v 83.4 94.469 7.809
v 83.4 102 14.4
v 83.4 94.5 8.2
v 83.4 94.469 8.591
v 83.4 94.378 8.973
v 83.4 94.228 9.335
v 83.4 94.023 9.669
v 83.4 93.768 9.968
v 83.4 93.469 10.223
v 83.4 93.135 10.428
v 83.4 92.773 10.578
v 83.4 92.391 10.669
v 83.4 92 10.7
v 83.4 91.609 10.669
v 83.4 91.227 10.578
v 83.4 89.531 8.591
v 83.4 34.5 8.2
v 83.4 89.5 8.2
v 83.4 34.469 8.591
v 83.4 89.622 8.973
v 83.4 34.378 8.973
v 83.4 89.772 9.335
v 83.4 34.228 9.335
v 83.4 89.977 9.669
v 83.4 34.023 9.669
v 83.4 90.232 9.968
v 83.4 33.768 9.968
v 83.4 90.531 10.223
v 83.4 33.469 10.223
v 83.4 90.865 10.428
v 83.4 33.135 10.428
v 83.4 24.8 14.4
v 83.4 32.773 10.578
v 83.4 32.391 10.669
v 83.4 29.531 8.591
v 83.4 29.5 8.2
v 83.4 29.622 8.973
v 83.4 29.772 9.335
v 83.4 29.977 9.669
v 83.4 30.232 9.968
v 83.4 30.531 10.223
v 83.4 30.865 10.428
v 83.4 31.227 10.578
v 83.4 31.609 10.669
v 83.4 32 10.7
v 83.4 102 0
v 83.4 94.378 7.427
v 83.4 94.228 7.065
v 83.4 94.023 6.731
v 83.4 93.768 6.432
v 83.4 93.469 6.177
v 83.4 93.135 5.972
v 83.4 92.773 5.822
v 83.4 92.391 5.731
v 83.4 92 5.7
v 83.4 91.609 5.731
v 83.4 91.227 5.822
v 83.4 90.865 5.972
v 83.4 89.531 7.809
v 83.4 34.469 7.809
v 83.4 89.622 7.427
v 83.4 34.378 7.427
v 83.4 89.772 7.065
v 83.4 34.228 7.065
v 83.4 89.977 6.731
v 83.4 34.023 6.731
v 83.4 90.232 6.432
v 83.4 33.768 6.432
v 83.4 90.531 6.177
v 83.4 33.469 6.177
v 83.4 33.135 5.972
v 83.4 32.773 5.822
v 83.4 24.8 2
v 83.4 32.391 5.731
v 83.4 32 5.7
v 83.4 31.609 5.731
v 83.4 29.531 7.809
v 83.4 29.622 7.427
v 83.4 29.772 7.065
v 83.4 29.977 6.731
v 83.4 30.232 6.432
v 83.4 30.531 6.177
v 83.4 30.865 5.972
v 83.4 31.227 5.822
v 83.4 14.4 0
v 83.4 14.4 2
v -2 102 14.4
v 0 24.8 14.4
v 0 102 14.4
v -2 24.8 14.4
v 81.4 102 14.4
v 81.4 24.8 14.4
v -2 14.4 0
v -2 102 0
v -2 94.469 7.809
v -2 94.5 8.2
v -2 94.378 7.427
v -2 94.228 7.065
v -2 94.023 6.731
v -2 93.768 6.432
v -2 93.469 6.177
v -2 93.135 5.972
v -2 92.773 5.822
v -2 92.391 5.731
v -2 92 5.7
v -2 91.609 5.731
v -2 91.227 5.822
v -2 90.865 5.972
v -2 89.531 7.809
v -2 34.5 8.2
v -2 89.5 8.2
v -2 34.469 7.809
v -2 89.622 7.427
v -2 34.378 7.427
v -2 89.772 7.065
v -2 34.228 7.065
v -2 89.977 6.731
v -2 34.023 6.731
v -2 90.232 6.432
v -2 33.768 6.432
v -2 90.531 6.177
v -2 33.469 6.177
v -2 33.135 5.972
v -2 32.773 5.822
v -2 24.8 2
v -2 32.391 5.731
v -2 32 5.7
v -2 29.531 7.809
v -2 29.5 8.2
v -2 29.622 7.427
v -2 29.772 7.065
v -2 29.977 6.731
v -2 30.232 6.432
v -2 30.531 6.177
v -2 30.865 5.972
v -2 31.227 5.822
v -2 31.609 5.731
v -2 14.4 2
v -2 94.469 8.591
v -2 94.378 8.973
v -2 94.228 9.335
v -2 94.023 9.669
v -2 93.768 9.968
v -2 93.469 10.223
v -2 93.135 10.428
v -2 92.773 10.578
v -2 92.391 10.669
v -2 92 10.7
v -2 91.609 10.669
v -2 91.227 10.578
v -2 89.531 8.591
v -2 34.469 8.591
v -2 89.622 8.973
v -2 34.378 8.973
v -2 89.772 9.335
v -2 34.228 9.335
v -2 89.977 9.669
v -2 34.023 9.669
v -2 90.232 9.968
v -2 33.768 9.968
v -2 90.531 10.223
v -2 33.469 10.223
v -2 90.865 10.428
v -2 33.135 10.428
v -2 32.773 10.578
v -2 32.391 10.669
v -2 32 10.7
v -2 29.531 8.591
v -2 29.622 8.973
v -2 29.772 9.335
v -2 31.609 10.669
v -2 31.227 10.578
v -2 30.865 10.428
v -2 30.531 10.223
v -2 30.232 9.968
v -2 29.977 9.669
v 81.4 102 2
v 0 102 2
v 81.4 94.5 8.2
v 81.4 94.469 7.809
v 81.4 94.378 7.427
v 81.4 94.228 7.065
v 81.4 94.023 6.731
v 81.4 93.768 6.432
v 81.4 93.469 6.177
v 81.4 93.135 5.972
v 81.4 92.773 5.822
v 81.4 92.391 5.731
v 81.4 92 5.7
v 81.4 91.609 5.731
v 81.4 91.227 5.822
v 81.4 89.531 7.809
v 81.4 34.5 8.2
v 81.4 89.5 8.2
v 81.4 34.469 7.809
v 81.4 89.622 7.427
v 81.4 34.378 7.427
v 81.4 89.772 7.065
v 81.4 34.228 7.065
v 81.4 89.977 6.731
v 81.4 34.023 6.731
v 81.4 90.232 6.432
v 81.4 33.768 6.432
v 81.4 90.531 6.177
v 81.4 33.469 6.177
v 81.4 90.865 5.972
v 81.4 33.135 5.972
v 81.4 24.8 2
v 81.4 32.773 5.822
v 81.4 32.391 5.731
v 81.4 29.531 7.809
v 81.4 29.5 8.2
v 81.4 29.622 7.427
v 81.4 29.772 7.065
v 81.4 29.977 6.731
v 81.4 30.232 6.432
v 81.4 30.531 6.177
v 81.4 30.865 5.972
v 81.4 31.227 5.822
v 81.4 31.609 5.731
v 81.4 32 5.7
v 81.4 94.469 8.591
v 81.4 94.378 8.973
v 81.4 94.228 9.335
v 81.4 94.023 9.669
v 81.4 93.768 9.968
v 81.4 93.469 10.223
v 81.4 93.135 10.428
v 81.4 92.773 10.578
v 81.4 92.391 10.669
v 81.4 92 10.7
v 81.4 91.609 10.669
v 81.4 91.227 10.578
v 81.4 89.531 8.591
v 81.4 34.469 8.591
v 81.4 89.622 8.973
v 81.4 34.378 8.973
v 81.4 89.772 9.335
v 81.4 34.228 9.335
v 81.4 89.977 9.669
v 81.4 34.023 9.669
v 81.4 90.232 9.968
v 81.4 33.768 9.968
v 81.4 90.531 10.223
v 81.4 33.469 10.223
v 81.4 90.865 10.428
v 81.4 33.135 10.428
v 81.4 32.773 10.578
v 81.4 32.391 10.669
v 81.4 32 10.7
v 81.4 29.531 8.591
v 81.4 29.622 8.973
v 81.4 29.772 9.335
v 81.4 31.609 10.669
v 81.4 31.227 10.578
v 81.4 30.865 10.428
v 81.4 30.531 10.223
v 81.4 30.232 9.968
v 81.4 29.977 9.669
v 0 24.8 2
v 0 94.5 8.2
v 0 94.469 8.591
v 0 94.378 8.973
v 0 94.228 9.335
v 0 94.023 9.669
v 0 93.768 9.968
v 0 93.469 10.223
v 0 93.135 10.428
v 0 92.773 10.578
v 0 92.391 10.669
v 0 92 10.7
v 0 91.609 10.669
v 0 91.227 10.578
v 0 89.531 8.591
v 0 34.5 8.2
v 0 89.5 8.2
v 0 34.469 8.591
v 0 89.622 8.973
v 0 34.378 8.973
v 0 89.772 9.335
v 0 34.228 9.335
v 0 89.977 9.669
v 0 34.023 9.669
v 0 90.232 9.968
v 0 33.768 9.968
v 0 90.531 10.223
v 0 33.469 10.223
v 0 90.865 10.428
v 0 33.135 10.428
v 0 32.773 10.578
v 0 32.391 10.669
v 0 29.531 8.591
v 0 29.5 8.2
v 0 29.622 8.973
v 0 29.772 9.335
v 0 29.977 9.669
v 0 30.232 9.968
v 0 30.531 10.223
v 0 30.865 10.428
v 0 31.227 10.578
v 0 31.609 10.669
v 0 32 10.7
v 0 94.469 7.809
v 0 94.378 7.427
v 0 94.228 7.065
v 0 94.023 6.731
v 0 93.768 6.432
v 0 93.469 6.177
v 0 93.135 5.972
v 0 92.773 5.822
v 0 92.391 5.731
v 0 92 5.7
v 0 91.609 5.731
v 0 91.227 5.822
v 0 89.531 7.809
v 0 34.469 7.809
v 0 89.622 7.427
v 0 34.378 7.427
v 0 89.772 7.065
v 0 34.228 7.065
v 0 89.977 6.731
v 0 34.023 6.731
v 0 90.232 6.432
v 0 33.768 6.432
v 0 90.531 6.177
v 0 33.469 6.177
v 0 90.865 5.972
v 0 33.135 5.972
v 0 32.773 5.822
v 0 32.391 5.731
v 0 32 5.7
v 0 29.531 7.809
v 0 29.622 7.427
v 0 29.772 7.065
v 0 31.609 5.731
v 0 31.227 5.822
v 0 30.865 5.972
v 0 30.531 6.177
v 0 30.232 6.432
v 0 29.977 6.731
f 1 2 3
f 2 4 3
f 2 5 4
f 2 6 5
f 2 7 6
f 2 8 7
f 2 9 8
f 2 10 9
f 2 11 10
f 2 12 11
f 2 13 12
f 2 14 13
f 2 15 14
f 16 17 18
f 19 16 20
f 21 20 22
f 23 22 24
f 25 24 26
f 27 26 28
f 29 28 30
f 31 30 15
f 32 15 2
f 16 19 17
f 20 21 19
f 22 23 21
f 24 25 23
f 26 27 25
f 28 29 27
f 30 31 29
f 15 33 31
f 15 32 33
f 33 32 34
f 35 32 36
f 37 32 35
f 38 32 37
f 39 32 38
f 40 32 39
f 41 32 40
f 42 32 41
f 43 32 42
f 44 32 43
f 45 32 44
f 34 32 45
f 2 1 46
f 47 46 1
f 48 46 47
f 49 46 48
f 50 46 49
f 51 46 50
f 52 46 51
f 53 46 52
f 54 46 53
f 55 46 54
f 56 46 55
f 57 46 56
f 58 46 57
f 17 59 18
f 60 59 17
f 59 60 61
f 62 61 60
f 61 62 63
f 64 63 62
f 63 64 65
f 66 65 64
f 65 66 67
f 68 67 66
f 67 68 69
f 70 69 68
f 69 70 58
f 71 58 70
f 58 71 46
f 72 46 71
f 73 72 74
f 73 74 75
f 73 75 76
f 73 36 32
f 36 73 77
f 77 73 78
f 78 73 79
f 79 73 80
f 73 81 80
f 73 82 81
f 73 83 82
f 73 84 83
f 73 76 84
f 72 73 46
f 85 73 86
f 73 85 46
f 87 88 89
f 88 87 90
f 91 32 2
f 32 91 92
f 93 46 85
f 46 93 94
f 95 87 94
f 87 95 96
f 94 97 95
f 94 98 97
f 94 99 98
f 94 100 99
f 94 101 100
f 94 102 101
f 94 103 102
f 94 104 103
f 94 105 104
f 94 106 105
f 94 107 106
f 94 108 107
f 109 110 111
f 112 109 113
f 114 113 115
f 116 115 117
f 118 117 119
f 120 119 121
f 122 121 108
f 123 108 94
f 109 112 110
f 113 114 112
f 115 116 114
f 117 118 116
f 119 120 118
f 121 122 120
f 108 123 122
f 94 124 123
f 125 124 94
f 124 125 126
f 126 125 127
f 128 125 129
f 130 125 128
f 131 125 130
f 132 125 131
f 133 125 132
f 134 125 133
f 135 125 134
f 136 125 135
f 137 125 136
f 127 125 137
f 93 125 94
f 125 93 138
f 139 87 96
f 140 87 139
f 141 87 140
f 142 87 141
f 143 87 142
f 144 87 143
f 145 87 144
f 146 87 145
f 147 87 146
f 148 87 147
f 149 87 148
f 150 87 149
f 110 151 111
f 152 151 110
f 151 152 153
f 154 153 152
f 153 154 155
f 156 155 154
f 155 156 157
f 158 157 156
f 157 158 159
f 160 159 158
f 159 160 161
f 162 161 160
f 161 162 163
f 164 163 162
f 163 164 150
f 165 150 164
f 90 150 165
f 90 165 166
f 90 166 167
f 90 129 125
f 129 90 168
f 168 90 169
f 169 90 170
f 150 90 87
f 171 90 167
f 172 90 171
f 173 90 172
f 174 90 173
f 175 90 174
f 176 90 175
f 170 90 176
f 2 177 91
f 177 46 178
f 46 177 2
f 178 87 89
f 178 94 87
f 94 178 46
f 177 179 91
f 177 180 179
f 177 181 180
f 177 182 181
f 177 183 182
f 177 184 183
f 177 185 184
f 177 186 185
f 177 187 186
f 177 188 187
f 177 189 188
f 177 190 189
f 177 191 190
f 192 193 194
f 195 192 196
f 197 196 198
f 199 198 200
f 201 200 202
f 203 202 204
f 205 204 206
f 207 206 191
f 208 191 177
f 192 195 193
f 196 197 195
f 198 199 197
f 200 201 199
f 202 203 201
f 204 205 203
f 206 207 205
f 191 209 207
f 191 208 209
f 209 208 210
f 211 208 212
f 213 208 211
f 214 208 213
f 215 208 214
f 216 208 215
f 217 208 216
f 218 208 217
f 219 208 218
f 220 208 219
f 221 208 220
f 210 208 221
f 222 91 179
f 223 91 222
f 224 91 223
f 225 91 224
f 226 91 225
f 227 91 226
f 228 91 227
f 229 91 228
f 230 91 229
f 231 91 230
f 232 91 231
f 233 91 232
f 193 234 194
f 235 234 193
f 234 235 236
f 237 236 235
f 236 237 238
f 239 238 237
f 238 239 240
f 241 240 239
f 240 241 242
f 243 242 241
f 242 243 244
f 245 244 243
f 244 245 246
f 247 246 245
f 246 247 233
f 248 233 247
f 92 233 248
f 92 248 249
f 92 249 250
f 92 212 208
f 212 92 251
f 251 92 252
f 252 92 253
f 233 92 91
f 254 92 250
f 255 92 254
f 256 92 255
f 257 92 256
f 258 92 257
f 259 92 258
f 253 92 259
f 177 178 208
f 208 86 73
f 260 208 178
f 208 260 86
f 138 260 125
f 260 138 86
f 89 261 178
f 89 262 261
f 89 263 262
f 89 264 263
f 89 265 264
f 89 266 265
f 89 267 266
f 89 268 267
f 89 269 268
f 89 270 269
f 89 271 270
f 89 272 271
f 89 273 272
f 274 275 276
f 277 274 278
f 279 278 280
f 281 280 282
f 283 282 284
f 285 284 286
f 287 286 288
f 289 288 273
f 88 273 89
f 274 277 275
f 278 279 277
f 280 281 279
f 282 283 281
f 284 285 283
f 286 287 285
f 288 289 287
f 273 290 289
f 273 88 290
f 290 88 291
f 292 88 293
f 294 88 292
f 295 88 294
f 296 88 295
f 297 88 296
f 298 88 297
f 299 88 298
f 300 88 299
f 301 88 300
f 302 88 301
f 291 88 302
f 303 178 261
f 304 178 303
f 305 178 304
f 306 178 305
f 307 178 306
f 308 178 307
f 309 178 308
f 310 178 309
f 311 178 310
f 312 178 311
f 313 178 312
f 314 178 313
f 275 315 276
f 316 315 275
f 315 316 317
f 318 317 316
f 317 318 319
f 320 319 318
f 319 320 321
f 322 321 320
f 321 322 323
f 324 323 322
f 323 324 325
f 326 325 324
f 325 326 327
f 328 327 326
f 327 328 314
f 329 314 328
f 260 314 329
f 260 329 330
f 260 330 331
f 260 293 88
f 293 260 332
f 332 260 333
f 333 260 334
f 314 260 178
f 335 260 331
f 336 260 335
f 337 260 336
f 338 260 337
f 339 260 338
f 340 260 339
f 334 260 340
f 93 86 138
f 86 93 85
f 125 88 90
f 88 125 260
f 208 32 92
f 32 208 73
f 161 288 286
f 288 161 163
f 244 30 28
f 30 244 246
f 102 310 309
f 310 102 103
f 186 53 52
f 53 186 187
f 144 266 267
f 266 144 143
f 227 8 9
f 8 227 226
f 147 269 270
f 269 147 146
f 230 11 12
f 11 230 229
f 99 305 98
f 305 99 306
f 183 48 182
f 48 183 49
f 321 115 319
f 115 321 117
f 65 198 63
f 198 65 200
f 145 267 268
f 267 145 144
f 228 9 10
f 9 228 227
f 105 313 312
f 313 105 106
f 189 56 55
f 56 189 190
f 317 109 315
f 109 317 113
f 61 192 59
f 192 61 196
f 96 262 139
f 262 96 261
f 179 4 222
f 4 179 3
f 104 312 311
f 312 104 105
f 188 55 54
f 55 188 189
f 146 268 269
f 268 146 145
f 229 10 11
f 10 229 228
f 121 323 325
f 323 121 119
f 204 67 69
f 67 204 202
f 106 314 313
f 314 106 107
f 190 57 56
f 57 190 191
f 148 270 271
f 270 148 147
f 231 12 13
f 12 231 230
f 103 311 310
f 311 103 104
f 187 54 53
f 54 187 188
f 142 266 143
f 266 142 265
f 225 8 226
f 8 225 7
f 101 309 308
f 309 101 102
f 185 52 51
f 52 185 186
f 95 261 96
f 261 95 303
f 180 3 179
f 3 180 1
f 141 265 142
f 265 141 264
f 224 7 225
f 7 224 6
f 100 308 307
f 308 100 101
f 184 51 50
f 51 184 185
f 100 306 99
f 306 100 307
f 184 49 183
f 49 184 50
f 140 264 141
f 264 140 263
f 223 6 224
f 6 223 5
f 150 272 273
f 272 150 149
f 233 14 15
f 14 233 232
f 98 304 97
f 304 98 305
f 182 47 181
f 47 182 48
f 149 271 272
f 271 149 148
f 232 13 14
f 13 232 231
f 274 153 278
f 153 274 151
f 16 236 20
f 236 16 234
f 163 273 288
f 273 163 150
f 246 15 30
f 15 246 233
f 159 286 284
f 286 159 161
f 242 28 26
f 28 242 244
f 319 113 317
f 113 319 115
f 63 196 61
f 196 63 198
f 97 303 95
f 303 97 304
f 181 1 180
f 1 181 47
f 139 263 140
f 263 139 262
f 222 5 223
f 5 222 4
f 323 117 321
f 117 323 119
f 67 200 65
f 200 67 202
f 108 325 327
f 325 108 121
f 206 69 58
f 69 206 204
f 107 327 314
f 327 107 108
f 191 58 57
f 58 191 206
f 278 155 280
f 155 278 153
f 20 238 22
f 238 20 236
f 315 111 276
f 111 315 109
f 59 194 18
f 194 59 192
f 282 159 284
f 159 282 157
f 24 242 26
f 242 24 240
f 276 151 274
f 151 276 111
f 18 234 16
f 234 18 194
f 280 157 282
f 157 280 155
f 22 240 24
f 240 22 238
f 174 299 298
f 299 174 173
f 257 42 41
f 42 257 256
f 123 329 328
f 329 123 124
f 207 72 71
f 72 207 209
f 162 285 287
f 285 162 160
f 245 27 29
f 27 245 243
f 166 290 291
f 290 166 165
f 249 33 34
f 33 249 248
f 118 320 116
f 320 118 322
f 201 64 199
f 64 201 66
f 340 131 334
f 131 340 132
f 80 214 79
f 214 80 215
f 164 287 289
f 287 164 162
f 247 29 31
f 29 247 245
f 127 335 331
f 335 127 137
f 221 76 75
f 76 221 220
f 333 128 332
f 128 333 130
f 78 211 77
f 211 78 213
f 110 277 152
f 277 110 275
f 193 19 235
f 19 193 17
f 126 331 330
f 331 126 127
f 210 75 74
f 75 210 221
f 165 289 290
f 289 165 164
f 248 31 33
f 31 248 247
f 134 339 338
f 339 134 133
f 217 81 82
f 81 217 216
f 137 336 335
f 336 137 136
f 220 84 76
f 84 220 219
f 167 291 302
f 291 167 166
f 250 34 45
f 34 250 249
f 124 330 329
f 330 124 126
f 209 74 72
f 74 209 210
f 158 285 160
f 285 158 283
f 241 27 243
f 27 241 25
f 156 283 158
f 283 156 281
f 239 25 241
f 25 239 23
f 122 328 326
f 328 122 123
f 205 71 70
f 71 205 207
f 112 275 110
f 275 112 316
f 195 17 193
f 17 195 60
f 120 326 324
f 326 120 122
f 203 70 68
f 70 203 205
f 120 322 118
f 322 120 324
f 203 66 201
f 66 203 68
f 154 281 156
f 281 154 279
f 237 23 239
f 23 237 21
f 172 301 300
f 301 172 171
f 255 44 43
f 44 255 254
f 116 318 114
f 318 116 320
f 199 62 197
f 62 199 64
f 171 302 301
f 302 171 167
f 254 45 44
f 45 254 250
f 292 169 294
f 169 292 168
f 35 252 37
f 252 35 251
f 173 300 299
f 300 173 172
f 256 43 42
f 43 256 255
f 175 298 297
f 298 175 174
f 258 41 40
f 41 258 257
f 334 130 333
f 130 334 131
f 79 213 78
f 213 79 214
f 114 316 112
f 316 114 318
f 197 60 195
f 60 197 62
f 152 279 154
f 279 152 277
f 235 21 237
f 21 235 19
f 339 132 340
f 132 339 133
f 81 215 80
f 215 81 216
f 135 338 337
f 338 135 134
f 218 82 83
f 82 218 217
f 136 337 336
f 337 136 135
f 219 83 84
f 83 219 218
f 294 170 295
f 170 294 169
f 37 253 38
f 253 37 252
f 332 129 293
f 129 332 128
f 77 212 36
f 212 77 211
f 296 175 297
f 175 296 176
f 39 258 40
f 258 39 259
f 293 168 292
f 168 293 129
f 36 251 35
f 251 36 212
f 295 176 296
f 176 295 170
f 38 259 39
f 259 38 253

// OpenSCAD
$fa = 1;
$fs = 0.4;

dice = 12.4; // dice are 12x12mm, added .2 for light tollerance
guide_rail = 0.5; //support the dice down a cullomb

number_dice = 6; // number af dice in a row

inner_box_width = dice * number_dice + guide_rail*number_dice; // x 
inner_box_height = 100; // y
inner_box_depth = dice;  // z

frame = 2; // thickness of frame
opener = 2; // just to break through walls

outer_box_width = inner_box_width + frame*2; // x
outer_box_height = inner_box_height + frame; // y
outer_box_depth = inner_box_depth + frame; // z

snap_height = 4;
snap_diameter = 5;

// its starts from the top and is subtracted. Thats why the low number is top and high is bottom 
snap_top = 10; 
snap_bottom = 70;

difference(){
    //outer frame. Translated to help compare to the dice holding box
    translate([-frame, 0, 0])
        cube([outer_box_width+frame*2, outer_box_height, outer_box_depth]);
    
    //remove inner box to make a frame
    translate([0, 0, frame])
        cube([outer_box_width, outer_box_height+opener, outer_box_depth+opener]);    

    //remove bottom to let dice out
    translate([-frame-opener, -opener, -opener])
        cube([outer_box_width+frame*2+opener*2, dice+frame+opener, frame+opener*2]);

    //remove side wall
    #translate([-frame-opener, -opener, frame])
        cube([outer_box_width+frame*2+opener*2, dice*2+opener, outer_box_depth]);

    translate([outer_box_width/2, outer_box_height-snap_top, outer_box_depth/2+frame/2])
        rotate([0, 90, 0])
        cylinder(h=outer_box_width+frame*2+opener*2, d=snap_diameter, center=true);

    translate([outer_box_width/2, outer_box_height-snap_bottom, outer_box_depth/2+frame/2])
        rotate([0, 90, 0])
        cylinder(h=outer_box_width+frame*2+opener*2, d=snap_diameter, center=true);
}
